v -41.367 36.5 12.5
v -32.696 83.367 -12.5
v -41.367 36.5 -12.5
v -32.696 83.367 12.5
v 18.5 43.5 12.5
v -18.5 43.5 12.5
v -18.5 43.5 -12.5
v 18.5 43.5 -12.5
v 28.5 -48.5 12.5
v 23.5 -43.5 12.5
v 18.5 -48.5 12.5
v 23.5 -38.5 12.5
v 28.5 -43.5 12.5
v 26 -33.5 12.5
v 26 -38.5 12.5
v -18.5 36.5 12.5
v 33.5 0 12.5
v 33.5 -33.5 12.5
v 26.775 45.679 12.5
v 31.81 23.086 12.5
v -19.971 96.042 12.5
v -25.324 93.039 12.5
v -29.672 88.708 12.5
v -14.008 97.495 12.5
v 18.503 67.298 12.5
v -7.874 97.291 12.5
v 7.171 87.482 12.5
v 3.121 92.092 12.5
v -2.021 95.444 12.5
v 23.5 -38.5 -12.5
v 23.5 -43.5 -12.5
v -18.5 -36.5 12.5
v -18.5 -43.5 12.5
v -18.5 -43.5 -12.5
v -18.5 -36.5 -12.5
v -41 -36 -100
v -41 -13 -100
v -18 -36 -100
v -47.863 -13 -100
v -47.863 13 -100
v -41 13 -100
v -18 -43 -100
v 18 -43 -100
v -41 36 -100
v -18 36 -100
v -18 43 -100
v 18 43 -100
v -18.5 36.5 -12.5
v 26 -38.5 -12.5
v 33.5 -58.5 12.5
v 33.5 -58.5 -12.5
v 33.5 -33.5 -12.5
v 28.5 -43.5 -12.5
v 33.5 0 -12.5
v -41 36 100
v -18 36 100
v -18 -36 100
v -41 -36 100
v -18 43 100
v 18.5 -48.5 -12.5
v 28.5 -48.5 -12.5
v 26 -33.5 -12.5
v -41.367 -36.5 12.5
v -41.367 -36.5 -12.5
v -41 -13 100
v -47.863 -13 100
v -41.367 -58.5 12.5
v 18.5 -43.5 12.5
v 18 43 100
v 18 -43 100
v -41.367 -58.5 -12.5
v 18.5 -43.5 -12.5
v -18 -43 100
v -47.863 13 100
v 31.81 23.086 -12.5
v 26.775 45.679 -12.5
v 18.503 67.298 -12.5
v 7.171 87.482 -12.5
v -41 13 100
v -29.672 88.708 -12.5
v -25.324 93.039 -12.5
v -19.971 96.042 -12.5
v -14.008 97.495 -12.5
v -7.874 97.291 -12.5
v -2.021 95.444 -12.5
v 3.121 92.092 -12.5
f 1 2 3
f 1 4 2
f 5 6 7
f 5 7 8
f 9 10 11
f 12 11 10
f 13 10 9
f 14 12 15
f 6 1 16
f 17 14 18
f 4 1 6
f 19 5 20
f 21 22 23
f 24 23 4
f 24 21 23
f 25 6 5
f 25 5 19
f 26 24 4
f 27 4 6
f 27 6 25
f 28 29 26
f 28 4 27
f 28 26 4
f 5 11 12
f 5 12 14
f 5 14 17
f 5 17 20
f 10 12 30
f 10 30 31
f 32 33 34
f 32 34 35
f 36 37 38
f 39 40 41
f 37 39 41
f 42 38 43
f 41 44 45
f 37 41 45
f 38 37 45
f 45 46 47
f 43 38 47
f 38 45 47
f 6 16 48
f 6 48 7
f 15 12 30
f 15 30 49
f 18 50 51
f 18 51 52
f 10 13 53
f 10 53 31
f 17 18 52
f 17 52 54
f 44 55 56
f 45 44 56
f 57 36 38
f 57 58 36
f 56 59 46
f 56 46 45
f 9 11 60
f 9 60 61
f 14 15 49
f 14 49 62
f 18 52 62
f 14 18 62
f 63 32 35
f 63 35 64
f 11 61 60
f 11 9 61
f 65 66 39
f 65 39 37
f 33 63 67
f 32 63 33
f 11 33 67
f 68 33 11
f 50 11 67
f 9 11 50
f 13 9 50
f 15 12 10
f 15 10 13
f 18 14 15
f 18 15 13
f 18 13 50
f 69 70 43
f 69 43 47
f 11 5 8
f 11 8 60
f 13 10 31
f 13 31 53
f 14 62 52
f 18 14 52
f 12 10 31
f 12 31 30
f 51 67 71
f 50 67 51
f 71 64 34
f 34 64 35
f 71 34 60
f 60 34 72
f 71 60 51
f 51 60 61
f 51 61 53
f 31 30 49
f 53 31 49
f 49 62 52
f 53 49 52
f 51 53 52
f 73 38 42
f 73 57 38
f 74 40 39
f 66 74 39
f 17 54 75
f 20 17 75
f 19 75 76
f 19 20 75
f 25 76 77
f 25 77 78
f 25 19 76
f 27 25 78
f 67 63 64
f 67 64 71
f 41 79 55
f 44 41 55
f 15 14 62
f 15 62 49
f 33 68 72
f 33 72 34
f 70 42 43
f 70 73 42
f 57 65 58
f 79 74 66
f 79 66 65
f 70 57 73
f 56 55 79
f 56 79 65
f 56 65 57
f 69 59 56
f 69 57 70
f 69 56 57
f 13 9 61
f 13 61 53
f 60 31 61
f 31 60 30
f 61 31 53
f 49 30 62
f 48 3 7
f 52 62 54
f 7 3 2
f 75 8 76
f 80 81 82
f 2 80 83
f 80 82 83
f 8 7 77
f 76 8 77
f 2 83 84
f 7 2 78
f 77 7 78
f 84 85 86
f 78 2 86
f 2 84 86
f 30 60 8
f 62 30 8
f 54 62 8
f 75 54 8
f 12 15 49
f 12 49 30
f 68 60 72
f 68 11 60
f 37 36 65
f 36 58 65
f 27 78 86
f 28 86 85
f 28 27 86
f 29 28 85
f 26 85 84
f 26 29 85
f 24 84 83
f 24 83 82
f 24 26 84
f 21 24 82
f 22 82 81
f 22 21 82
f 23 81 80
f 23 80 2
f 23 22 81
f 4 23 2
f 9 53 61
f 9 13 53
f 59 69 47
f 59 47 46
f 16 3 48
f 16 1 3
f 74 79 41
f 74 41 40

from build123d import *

# Parameters (mm, degrees)
F0_W     = 23
F0_H     = 23
F1_DEPTH = 100
F3_DEPTH = 12.5
F4_DEPTH = 12.5


with BuildPart() as f1:
    # F0 (on Top) → F1 (new body, symmetric)
    with BuildSketch(Plane.XY):
        Polygon((-18, -43), (18, -43), (18, 43), (-18, 43), (-18, 36), (-18, 13), (-18, -13), (-18, -36), align=None)
        with Locations((-29.5, -24.5)):
            Rectangle(F0_W, F0_H)
        with Locations((-29.5, 24.5)):
            Rectangle(F0_W, F0_H)
        Polygon((-41, -13), (-18, -13), (-18, 13), (-41, 13), (-47.8632581255, 13), (-47.8632581255, -13), align=None)
    extrude(amount=F1_DEPTH, both=True)


with BuildPart() as f3:
    # F2 (on Top) → F3 (new body, symmetric)
    with BuildSketch(Plane.XY):
        Polygon((18.5, -48.5), (18.5, -43.5), (-18.5, -43.5), (-18.5, -36.5), (-41.3665984659, -36.5), (-41.3665984659, -58.5), (33.5, -58.5), (33.5, -33.5), (26, -33.5), (26, -38.5), (23.5, -38.5), (23.5, -43.5), (28.5, -43.5), (28.5, -48.5), align=None)
    extrude(amount=F3_DEPTH, both=True)


with BuildPart() as f4:
    # F2 (on Top) → F4 (new body, symmetric)
    with BuildSketch(Plane.XY):
        with BuildLine():
            Line((-41.3665984659, 36.5), (-18.5, 36.5))
            Line((-18.5, 36.5), (-18.5, 43.5))
            Line((-18.5, 43.5), (18.5, 43.5))
            Line((18.5, 43.5), (18.5, -43.5))
            Line((18.5, -43.5), (18.5, -48.5))
            Line((18.5, -48.5), (28.5, -48.5))
            Line((28.5, -48.5), (28.5, -43.5))
            Line((28.5, -43.5), (23.5, -43.5))
            Line((23.5, -43.5), (23.5, -38.5))
            Line((23.5, -38.5), (26, -38.5))
            Line((26, -38.5), (26, -33.5))
            Line((26, -33.5), (33.5, -33.5))
            Line((33.5, -33.5), (33.5, 0))
            ThreePointArc((33.5, 0), (26.7751416528, 45.6788394805), (7.1712129175, 87.4815436301))
            ThreePointArc((7.1712129175, 87.4815436301), (-14.0081077066, 97.4947079369), (-32.6959081349, 83.3669623033))
            Line((-32.6959081349, 83.3669623033), (-41.3665984659, 36.5))
        make_face()
    extrude(amount=F4_DEPTH, both=True)


solid = Compound([f1.part, f3.part, f4.part])
